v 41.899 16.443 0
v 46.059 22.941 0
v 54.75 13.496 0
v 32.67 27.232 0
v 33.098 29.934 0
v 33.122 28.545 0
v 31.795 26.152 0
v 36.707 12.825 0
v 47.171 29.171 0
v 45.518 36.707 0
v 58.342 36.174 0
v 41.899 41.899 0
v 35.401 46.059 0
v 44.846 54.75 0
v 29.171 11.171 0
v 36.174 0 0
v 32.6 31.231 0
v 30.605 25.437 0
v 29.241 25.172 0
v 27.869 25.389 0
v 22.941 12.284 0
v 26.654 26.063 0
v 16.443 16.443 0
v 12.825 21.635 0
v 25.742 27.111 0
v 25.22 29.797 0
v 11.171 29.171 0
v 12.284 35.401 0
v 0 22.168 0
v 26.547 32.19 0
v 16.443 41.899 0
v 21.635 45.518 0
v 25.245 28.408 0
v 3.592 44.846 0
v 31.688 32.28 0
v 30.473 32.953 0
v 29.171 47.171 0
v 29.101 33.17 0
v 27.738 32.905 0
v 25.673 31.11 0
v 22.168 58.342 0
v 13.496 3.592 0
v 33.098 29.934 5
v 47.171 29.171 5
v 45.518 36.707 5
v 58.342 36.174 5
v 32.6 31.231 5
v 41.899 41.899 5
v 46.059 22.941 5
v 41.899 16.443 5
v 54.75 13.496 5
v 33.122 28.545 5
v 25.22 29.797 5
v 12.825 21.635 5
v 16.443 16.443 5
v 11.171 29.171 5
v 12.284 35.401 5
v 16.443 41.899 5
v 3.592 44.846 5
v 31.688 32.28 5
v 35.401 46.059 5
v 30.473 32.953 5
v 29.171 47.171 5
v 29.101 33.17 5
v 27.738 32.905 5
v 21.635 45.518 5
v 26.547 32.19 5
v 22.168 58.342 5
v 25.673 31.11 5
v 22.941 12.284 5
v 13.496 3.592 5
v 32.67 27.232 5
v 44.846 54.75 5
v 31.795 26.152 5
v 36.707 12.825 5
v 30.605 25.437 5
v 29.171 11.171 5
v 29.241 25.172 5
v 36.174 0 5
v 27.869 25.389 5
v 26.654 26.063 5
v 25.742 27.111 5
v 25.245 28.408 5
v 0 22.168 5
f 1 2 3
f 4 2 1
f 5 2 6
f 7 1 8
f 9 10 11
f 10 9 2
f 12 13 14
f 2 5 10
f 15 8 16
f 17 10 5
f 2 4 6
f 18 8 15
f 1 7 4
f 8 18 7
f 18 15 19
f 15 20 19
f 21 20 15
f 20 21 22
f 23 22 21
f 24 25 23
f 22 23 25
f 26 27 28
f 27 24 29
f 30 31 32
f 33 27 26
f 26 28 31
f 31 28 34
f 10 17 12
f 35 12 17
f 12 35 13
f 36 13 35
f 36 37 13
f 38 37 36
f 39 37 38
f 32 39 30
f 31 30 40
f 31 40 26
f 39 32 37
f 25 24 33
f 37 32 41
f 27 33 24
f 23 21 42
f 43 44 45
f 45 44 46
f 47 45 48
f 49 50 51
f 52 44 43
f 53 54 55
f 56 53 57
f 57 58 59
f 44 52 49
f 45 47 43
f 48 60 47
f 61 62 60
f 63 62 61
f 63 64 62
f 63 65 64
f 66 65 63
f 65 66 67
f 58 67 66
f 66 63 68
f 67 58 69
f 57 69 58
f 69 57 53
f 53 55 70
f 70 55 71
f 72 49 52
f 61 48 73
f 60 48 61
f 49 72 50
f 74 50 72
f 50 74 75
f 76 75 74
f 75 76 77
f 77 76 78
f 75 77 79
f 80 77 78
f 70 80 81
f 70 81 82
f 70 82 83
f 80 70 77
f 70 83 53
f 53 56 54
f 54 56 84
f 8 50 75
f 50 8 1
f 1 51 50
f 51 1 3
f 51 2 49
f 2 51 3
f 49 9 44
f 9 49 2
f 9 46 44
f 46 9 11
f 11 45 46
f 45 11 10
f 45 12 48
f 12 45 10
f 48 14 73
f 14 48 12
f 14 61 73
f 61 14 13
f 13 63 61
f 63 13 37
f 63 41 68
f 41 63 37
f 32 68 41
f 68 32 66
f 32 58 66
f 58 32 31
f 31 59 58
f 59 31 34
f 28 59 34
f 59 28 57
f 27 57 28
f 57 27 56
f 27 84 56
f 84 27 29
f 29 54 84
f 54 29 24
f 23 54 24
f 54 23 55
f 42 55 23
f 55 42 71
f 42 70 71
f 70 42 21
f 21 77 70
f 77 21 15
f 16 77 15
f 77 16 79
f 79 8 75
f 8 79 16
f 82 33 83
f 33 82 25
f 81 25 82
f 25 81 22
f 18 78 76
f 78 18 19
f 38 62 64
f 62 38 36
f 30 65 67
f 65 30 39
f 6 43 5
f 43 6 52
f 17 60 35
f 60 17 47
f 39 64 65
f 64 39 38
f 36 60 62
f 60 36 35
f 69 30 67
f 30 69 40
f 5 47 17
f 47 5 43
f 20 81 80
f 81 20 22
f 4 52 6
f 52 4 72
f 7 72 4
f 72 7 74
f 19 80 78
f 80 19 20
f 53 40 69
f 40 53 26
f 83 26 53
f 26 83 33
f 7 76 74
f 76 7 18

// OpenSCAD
$fn = 32;

// ----------------------------------------------------------------------
// Star wheel: 8-point ratchet, R30
// ----------------------------------------------------------------------

// --- parameters (mm) ---
n_points = 8;             // number of points / teeth
r_out = 30;               // tip radius
r_in = 18;                // root radius
bore_r = 4;               // centre bore radius
plate_t = 5;              // plate thickness, Z (extrusion height)
bore_d = 8;               // centre bore diameter

profile = [[47.171, 29.171], [58.342, 36.174], [45.518, 36.707], [41.899, 41.899], [44.846, 54.75], [35.401, 46.059], [29.171, 47.171], [22.168, 58.342], [21.635, 45.518], [16.443, 41.899], [3.592, 44.846], [12.284, 35.401], [11.171, 29.171], [0, 22.168], [12.825, 21.635], [16.443, 16.443], [13.496, 3.592], [22.941, 12.284], [29.171, 11.171], [36.174, 0], [36.707, 12.825], [41.899, 16.443], [54.75, 13.496], [46.059, 22.941]];  // primary outline, 24 points, counter clockwise
void_1 = [[33.098, 29.934], [32.6, 31.231], [31.688, 32.28], [30.473, 32.953], [29.101, 33.17], [27.738, 32.905], [26.547, 32.19], [25.673, 31.11], [25.22, 29.797], [25.245, 28.408], [25.742, 27.111], [26.654, 26.063], [27.869, 25.389], [29.241, 25.172], [30.605, 25.437], [31.795, 26.152], [32.67, 27.232], [33.122, 28.545]];  // centre bore, 18 points

// --- the one profile operation ---
difference() {
  linear_extrude(height = plate_t) polygon(points = profile);
  translate([0, 0, -1])
    linear_extrude(height = plate_t + 2) polygon(points = void_1);
}
